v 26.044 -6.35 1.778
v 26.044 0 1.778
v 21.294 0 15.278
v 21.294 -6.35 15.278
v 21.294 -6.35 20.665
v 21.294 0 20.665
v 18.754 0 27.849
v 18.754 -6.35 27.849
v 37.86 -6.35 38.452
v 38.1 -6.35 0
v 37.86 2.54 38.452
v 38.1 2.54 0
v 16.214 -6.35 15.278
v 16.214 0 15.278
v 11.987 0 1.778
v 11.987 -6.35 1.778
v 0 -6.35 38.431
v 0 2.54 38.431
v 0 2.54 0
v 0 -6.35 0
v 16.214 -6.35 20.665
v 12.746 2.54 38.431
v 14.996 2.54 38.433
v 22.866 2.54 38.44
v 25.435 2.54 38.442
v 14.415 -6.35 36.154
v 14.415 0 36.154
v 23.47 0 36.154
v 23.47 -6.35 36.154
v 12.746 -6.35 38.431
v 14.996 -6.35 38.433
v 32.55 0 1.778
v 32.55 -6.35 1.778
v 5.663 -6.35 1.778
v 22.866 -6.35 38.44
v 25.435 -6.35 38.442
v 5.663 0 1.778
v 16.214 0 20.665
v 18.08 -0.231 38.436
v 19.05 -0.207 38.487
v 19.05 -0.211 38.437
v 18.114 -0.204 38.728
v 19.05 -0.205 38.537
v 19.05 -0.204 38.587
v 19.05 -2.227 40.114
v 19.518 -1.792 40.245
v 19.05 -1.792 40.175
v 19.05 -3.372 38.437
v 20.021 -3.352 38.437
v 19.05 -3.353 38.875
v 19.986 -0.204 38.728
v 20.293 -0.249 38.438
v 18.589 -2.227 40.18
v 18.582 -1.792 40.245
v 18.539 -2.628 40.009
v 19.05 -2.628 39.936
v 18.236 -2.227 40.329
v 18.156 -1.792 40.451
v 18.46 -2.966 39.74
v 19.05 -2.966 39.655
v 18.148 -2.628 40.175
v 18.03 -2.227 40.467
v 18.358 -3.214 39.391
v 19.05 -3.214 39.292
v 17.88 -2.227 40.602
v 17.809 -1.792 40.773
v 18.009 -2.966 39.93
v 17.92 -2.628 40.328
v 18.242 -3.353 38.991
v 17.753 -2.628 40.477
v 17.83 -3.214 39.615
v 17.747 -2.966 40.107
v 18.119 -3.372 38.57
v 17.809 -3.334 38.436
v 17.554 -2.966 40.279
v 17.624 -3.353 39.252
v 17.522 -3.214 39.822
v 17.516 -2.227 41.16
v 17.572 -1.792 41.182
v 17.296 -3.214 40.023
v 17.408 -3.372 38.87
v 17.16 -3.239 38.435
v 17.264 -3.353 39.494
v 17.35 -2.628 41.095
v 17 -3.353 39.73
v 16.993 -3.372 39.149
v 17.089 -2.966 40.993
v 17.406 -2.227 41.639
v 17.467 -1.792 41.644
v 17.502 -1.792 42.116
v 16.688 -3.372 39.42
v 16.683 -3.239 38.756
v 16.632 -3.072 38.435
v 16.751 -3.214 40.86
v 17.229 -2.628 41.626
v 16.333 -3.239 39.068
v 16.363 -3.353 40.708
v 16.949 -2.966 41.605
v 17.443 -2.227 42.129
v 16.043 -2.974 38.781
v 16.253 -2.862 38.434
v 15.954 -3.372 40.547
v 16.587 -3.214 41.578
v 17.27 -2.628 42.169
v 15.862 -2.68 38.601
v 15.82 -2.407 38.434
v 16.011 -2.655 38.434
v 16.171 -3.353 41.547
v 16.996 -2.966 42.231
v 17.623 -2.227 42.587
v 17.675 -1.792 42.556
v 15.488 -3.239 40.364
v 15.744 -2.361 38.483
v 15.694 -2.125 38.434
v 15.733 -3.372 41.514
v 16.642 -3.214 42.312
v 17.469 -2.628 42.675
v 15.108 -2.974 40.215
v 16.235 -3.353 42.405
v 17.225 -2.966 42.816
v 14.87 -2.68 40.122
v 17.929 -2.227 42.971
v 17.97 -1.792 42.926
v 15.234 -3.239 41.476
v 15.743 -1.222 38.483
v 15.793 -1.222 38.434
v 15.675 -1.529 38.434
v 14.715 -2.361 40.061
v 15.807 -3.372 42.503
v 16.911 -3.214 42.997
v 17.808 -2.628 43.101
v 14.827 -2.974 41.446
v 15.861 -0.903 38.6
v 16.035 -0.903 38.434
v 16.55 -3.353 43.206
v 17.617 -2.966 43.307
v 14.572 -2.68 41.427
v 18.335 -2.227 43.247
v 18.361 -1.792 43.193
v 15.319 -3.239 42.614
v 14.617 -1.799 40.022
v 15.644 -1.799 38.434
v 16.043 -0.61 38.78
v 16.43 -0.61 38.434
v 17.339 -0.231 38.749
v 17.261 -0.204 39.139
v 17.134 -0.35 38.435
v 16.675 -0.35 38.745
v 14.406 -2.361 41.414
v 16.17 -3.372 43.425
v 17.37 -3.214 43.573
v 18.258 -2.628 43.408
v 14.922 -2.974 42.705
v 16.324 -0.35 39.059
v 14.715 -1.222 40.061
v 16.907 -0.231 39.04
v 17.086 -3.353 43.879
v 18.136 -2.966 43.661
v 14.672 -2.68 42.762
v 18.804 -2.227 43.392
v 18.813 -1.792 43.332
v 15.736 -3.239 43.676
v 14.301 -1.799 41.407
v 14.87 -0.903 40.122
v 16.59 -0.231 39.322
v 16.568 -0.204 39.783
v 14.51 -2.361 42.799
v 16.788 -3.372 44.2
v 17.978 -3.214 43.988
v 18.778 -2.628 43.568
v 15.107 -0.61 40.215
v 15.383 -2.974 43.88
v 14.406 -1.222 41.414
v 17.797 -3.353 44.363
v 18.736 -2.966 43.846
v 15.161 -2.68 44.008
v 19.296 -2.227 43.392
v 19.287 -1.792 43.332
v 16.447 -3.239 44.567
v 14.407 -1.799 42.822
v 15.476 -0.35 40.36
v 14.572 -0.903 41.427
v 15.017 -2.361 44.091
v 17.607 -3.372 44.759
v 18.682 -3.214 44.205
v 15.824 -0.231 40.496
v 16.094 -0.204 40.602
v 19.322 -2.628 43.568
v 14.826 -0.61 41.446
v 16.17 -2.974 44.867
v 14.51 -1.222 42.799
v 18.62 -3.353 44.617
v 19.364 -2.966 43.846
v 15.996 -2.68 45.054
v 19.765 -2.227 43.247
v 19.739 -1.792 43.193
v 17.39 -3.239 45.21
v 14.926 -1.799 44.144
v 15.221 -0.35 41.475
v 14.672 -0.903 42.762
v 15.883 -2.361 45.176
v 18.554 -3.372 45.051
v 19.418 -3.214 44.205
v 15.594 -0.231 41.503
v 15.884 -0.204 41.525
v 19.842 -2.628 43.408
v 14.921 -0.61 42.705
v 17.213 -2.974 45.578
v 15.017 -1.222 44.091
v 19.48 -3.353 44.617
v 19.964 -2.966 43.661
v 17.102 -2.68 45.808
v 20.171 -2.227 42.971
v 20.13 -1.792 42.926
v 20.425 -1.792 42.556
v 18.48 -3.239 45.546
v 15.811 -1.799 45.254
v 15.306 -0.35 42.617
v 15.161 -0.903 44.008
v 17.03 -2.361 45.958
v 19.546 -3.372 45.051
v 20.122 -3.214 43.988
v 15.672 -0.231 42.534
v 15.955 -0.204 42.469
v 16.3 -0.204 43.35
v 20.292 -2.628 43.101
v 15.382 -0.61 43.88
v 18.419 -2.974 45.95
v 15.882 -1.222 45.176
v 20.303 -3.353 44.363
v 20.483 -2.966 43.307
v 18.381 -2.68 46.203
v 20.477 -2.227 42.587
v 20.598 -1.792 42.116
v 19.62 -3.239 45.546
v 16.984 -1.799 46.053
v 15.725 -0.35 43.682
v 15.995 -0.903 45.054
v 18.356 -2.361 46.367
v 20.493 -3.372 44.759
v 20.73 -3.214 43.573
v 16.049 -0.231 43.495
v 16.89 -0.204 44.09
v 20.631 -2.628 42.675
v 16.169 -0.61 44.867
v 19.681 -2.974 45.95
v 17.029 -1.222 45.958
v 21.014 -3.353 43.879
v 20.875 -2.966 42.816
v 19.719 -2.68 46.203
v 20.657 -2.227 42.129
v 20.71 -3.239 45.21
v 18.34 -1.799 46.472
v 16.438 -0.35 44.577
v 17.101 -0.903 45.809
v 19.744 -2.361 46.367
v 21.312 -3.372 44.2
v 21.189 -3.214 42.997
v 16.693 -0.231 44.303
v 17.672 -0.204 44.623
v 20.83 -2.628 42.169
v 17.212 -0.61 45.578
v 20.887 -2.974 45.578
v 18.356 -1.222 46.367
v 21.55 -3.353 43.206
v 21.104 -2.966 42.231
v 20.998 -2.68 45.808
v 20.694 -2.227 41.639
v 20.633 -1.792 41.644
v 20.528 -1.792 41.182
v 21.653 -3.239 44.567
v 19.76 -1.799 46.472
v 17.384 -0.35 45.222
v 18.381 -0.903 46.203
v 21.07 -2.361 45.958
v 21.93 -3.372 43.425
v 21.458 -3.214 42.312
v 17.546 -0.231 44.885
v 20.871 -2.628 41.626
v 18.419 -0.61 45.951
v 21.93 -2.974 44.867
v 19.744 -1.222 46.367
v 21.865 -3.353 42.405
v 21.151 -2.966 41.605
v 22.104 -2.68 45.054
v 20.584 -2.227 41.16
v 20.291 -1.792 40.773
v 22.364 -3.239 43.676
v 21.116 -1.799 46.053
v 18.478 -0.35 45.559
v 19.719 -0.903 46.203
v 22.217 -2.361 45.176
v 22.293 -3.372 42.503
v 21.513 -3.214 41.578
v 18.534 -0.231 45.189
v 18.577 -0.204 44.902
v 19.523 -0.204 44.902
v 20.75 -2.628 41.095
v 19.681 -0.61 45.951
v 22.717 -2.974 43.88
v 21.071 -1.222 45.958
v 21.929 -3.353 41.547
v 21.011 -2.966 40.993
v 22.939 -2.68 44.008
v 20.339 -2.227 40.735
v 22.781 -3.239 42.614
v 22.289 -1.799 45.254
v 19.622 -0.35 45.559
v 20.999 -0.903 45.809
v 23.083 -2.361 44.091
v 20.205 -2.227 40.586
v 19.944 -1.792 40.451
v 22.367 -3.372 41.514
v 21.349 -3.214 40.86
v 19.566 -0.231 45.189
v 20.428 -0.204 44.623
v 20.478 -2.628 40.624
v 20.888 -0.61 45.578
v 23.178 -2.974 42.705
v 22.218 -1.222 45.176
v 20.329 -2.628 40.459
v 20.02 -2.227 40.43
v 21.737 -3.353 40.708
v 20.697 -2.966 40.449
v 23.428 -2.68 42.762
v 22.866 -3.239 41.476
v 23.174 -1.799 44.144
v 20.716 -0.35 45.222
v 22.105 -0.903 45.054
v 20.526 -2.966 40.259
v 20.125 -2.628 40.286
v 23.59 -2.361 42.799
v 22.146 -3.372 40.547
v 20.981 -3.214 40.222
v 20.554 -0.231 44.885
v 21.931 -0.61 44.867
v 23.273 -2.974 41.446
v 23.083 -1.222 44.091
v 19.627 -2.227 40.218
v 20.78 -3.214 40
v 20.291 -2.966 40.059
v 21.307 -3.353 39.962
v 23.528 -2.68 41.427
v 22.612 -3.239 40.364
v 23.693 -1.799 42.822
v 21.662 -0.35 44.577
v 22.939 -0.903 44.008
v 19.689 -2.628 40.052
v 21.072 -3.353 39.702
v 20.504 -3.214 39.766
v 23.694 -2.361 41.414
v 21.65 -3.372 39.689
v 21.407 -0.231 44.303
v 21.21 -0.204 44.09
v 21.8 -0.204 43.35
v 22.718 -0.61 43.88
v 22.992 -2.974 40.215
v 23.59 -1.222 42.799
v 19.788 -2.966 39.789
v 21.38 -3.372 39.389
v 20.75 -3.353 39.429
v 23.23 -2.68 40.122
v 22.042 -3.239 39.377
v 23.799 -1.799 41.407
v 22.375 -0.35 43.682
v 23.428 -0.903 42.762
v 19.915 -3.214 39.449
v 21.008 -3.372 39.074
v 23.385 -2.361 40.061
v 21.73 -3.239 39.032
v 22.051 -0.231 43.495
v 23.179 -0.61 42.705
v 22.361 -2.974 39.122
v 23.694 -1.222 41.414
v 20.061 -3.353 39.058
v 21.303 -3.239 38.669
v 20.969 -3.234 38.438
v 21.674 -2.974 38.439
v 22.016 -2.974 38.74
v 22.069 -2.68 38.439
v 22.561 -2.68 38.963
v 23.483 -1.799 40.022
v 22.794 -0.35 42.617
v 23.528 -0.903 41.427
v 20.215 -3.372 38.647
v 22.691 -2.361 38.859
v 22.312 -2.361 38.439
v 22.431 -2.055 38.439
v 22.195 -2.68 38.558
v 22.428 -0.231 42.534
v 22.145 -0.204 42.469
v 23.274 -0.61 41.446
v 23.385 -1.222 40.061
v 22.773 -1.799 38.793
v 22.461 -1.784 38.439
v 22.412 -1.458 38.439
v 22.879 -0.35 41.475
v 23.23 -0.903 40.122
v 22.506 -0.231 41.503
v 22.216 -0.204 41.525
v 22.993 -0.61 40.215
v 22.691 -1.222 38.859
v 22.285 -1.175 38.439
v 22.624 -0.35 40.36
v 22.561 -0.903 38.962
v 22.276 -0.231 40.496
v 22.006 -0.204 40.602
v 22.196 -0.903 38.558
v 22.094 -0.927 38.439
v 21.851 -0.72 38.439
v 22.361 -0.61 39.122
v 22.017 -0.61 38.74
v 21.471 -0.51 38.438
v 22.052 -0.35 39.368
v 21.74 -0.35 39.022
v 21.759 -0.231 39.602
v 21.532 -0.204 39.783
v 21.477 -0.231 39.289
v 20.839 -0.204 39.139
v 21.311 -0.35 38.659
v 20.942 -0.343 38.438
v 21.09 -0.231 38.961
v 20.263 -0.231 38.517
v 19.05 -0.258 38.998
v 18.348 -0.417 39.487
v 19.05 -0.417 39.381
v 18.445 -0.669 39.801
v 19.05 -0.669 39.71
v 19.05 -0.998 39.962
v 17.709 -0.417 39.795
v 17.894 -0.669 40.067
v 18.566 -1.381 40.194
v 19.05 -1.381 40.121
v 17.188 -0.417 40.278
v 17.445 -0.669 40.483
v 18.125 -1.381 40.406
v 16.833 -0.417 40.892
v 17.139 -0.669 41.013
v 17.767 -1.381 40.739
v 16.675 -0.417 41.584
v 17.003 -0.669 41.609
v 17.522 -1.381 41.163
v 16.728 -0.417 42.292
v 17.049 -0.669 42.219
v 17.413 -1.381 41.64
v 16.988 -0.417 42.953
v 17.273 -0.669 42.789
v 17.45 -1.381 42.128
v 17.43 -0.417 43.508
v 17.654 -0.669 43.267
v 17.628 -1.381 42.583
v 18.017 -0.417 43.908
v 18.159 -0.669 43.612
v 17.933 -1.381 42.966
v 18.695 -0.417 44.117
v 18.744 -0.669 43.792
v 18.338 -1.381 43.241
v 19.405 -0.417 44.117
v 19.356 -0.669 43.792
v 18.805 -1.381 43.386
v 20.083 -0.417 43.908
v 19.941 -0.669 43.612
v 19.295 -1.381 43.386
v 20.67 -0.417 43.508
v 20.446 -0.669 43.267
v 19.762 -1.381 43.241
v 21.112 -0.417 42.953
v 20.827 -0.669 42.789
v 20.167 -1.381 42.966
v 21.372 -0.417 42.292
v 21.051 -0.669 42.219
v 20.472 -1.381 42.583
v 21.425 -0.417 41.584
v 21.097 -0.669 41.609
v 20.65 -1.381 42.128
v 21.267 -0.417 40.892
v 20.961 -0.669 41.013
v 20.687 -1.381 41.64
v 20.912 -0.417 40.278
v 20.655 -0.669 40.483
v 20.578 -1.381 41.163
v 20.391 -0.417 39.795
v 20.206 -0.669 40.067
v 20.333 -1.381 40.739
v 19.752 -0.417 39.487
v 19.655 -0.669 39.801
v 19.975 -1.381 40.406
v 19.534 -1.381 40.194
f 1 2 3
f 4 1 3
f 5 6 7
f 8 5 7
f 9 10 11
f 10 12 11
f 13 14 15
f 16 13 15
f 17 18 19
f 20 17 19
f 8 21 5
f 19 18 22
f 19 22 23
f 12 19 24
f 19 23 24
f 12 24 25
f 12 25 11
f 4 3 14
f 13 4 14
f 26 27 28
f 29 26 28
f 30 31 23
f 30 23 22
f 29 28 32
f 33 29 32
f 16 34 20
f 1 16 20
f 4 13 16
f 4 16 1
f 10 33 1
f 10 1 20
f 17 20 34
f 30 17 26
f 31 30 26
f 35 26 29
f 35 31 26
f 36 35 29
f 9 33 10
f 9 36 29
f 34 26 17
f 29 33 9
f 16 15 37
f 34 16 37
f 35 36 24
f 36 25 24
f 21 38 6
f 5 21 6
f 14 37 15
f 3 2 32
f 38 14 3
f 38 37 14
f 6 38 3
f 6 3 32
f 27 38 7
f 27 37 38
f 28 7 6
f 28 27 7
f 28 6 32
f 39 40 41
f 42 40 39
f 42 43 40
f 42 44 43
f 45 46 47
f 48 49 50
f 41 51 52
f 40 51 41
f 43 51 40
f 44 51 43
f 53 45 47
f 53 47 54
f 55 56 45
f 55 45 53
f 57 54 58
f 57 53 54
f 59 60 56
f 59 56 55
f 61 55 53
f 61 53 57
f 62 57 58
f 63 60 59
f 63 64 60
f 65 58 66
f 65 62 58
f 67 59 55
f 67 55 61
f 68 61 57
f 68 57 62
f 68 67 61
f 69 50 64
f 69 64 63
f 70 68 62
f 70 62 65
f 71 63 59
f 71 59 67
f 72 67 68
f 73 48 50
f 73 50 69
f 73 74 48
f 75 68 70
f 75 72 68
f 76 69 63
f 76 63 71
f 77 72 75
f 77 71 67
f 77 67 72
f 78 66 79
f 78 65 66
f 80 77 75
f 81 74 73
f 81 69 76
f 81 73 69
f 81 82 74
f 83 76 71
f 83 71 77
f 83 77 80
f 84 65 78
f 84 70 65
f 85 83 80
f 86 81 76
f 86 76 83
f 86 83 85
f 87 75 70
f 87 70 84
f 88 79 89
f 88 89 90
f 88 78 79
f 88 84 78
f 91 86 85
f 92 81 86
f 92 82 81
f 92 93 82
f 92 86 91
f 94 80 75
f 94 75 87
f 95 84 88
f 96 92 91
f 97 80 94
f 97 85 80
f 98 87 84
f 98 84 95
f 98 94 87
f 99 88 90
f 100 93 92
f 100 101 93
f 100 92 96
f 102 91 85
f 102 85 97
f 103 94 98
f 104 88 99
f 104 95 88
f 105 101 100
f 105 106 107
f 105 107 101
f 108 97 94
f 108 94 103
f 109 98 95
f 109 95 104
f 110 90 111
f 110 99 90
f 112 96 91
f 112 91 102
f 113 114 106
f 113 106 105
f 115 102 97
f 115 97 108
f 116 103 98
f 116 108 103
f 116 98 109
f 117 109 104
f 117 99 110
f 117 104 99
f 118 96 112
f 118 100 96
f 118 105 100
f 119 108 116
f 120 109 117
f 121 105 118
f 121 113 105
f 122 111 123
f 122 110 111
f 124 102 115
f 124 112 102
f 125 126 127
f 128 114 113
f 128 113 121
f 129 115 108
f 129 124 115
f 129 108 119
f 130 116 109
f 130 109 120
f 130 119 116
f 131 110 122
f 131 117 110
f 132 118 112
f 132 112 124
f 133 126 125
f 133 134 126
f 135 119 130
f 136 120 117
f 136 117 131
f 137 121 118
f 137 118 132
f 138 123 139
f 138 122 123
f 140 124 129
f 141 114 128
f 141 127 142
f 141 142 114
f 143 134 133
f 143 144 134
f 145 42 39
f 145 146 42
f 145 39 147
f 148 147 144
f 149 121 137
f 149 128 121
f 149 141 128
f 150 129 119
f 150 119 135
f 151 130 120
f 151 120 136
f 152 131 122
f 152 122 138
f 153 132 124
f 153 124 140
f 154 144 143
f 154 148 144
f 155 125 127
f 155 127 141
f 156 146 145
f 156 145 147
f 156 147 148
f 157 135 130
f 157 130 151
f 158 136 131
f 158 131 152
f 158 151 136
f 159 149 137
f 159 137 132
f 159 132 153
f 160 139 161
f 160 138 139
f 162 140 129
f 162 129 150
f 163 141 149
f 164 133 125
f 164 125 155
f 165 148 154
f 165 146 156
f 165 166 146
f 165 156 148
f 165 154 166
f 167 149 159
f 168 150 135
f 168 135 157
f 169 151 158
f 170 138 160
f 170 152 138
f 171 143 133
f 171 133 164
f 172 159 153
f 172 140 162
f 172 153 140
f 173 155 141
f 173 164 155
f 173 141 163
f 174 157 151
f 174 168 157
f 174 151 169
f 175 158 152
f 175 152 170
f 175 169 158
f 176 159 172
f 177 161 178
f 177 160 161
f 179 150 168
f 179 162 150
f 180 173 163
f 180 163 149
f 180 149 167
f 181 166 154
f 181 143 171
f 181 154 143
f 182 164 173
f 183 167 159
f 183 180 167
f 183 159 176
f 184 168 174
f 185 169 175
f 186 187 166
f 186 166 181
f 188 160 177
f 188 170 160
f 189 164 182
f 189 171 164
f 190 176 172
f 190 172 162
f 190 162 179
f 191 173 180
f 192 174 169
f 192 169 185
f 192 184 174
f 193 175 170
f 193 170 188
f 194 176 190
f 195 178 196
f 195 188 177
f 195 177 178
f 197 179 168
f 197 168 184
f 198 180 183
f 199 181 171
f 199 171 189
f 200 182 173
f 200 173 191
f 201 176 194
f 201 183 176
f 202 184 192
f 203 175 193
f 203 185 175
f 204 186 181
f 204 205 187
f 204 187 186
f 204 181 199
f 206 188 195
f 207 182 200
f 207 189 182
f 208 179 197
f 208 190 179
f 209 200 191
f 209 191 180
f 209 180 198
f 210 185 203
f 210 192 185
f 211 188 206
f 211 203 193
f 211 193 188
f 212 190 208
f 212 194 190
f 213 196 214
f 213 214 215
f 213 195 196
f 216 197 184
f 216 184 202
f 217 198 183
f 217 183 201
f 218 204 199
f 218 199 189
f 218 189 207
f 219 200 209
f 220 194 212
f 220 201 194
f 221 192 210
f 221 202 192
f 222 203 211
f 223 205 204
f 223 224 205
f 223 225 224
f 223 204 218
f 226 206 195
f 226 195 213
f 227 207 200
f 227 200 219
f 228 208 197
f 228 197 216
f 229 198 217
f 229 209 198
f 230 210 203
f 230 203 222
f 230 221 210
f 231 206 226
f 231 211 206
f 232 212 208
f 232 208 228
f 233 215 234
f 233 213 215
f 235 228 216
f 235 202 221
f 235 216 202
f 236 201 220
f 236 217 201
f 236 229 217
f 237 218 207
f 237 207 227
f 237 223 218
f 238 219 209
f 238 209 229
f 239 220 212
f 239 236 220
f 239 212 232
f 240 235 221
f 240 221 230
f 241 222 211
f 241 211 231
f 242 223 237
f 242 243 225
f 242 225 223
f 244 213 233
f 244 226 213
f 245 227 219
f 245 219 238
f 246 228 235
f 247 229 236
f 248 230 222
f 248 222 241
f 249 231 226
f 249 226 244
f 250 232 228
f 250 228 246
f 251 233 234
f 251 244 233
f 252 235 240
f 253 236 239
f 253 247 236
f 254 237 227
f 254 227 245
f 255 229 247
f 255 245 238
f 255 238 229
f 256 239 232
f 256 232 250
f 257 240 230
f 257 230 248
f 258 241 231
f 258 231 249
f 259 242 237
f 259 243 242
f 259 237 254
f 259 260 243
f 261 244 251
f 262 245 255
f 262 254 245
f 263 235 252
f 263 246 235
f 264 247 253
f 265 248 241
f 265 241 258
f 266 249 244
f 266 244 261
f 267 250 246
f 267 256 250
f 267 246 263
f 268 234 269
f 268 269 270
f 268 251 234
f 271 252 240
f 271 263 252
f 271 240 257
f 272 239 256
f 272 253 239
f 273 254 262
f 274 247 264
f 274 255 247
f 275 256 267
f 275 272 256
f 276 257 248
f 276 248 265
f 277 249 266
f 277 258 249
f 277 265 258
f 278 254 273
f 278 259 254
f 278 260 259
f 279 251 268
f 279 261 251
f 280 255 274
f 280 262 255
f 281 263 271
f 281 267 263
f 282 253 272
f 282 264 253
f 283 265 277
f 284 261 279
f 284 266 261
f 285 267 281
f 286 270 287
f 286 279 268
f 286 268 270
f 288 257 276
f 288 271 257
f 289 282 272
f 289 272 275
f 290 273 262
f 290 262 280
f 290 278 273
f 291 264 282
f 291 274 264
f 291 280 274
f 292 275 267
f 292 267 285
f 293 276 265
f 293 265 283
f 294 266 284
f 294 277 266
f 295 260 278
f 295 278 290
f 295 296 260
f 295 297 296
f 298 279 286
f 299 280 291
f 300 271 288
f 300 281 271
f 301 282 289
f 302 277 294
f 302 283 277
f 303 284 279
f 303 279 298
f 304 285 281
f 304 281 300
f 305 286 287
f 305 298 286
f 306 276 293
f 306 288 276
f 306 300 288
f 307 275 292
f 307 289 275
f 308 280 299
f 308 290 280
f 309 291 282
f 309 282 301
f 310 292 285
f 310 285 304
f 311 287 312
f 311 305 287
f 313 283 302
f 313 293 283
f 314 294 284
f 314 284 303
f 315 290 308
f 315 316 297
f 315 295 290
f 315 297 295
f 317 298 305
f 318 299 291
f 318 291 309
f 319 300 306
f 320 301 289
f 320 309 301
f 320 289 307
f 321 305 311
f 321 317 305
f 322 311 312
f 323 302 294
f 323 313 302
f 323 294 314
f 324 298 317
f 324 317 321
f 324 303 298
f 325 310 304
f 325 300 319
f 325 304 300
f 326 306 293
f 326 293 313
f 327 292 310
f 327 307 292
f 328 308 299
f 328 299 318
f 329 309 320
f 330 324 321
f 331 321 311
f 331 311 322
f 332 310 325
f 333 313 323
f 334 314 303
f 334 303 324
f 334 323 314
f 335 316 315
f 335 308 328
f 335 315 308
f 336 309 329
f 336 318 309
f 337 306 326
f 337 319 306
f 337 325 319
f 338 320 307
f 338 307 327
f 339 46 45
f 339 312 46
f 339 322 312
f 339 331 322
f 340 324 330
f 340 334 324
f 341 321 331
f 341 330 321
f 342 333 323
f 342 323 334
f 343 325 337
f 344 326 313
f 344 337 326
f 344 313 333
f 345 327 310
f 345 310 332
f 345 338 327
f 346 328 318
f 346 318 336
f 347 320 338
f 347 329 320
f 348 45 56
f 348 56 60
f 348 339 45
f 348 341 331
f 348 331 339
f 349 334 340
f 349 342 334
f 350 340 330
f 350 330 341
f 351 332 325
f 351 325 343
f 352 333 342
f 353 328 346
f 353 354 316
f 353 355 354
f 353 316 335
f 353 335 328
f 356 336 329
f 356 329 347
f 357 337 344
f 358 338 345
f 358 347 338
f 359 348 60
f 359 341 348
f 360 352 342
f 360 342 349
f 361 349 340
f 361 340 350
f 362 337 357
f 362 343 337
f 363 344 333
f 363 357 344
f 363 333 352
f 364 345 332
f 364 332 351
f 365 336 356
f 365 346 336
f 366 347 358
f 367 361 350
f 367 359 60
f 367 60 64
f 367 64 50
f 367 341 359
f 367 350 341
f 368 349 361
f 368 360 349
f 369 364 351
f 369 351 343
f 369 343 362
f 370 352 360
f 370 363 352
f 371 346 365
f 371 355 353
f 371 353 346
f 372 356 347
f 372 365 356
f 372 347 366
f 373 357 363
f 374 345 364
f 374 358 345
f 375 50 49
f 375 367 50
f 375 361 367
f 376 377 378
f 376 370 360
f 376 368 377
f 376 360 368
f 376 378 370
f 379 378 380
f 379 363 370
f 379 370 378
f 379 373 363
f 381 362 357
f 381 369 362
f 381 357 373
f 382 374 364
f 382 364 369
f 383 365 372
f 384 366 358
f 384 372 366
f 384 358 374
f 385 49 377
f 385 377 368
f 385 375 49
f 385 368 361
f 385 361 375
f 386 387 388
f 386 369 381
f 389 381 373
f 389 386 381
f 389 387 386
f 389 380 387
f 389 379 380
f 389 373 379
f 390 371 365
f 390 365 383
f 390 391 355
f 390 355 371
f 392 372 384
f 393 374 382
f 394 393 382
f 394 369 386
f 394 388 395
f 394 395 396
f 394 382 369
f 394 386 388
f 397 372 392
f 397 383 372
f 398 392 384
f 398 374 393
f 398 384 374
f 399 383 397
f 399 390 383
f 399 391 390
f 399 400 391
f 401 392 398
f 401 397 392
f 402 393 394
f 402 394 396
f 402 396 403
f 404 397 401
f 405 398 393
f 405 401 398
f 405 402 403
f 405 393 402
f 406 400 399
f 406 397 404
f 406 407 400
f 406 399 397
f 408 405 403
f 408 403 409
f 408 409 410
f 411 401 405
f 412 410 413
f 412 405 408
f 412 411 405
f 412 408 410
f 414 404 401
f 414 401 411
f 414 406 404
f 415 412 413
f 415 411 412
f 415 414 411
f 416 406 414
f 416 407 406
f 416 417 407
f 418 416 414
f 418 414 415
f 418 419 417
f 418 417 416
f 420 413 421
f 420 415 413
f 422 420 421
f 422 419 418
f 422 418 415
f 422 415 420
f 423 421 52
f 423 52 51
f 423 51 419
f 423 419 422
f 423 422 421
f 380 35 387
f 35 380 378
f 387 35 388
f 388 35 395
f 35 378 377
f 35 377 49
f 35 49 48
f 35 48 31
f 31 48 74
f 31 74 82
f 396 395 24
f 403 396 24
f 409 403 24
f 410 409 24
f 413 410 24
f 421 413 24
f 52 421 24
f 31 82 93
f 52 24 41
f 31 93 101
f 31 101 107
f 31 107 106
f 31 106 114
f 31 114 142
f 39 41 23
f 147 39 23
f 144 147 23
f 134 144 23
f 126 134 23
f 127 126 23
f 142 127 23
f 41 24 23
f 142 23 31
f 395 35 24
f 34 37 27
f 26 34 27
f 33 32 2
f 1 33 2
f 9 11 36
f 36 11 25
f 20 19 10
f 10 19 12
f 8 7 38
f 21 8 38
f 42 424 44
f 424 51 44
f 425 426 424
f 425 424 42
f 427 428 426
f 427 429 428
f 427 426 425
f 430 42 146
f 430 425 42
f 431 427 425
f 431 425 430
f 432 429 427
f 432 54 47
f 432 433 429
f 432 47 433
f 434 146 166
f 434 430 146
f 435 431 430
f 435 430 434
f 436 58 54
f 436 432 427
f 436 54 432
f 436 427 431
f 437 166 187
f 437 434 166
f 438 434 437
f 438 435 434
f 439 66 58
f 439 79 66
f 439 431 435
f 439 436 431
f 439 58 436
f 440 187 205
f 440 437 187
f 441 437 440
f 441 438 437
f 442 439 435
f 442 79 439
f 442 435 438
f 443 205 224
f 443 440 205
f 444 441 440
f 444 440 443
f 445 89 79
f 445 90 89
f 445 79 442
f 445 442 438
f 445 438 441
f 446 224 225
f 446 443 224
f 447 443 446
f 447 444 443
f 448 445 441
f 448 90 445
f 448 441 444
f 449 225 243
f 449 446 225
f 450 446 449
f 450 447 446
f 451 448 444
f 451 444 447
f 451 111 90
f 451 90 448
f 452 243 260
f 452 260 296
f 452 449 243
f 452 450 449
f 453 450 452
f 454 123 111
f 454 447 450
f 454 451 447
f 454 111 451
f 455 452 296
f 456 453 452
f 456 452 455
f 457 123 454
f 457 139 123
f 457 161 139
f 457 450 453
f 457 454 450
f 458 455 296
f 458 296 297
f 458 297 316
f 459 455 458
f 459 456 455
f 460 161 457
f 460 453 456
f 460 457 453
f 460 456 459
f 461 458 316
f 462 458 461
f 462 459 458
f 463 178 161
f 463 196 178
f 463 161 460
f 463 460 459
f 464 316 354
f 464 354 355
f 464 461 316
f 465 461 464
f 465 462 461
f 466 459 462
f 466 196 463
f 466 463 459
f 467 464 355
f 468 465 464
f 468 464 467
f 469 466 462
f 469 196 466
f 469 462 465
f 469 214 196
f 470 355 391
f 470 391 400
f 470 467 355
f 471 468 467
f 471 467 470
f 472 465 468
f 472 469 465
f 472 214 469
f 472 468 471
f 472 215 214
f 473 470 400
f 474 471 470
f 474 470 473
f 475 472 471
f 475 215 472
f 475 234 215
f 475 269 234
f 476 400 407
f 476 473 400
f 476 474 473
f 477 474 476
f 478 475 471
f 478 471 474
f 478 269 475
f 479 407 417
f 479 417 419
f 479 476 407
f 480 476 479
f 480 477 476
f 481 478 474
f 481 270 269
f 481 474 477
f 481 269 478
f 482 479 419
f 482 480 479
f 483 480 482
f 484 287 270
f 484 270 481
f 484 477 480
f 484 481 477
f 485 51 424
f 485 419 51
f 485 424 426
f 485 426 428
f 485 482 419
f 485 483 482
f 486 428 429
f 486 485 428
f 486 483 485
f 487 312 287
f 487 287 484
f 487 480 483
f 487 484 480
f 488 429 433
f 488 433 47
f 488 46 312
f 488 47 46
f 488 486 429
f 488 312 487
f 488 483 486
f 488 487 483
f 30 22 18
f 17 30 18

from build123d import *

# Parameters (mm, degrees)
F1_DEPTH = 2.54
F2_DEPTH = 6.35


with BuildPart() as f1:
    # F0 (on Front) → F1 (new body)
    with BuildSketch(Plane.XZ):
        Polygon((14.4152494168, 36.1535907401), (5.6633852157, 1.778), (11.9867476806, 1.778), (16.2139723114, 15.2778414103), (21.2939723114, 15.2778414103), (26.0443502781, 1.778), (32.5503381746, 1.778), (23.4699654551, 36.1535907401), align=None)
        Polygon((21.2939723114, 20.6651952089), (16.2139723114, 20.6651952089), (18.7539723114, 27.8494001058), align=None, mode=Mode.SUBTRACT)
        Polygon((0, 0), (5.08, 0), (5.2107147535, 0), (5.6633852157, 1.778), (14.4152494168, 36.1535907401), (14.9956496651, 38.4332880643), (12.7460089281, 38.4314865499), (0, 38.4314865499), align=None)
        Polygon((32.5503381746, 1.778), (33.02, 0), (38.1, 0), (37.8601082237, 38.4515979446), (25.4348134573, 38.4416477567), (22.8661145367, 38.4395907401), (23.4699654551, 36.1535907401), align=None)
        Polygon((11.9867476806, 1.778), (11.43, 0), (26.67, 0), (26.0443502781, 1.778), (21.2939723114, 15.2778414103), (16.2139723114, 15.2778414103), align=None)
        Polygon((14.9956496651, 38.4332880643), (14.4152494168, 36.1535907401), (23.4699654551, 36.1535907401), (22.8661145367, 38.4395907401), align=None)
        Polygon((18.7539723114, 27.8494001058), (16.2139723114, 20.6651952089), (21.2939723114, 20.6651952089), align=None)
        Polygon((26.0443502781, 1.778), (26.67, 0), (33.02, 0), (32.5503381746, 1.778), align=None)
        Polygon((5.6633852157, 1.778), (5.2107147535, 0), (11.43, 0), (11.9867476806, 1.778), align=None)
    extrude(amount=-F1_DEPTH)

    # F0 (on Front) → F2 (join)
    with BuildSketch(Plane.XZ):
        Polygon((0, 0), (5.08, 0), (5.2107147535, 0), (5.6633852157, 1.778), (14.4152494168, 36.1535907401), (14.9956496651, 38.4332880643), (12.7460089281, 38.4314865499), (0, 38.4314865499), align=None)
        Polygon((18.7539723114, 27.8494001058), (16.2139723114, 20.6651952089), (21.2939723114, 20.6651952089), align=None)
        Polygon((32.5503381746, 1.778), (33.02, 0), (38.1, 0), (37.8601082237, 38.4515979446), (25.4348134573, 38.4416477567), (22.8661145367, 38.4395907401), (23.4699654551, 36.1535907401), align=None)
        Polygon((11.9867476806, 1.778), (11.43, 0), (26.67, 0), (26.0443502781, 1.778), (21.2939723114, 15.2778414103), (16.2139723114, 15.2778414103), align=None)
        Polygon((14.9956496651, 38.4332880643), (14.4152494168, 36.1535907401), (23.4699654551, 36.1535907401), (22.8661145367, 38.4395907401), align=None)
        Polygon((26.0443502781, 1.778), (26.67, 0), (33.02, 0), (32.5503381746, 1.778), align=None)
        Polygon((5.6633852157, 1.778), (5.2107147535, 0), (11.43, 0), (11.9867476806, 1.778), align=None)
    extrude(amount=F2_DEPTH)

    # F4 (on offset) → F5 (revolve)
    with BuildSketch(Plane.YZ.offset(19.05)):
        with BuildLine():
            ThreePointArc((-1.7915181816, 40.1749286294), (-2.9140501967, 37.4648966143), (-0.2040181816, 38.5874286294))
            ThreePointArc((-0.2040181816, 38.5874286294), (-0.6689861664, 39.7099606445), (-1.7915181816, 40.1749286294))
        make_face()
    revolve(axis=Axis((19.05, 1.9485244993, 41.7624286294), (0, 1, 0)))


solid = f1.part
